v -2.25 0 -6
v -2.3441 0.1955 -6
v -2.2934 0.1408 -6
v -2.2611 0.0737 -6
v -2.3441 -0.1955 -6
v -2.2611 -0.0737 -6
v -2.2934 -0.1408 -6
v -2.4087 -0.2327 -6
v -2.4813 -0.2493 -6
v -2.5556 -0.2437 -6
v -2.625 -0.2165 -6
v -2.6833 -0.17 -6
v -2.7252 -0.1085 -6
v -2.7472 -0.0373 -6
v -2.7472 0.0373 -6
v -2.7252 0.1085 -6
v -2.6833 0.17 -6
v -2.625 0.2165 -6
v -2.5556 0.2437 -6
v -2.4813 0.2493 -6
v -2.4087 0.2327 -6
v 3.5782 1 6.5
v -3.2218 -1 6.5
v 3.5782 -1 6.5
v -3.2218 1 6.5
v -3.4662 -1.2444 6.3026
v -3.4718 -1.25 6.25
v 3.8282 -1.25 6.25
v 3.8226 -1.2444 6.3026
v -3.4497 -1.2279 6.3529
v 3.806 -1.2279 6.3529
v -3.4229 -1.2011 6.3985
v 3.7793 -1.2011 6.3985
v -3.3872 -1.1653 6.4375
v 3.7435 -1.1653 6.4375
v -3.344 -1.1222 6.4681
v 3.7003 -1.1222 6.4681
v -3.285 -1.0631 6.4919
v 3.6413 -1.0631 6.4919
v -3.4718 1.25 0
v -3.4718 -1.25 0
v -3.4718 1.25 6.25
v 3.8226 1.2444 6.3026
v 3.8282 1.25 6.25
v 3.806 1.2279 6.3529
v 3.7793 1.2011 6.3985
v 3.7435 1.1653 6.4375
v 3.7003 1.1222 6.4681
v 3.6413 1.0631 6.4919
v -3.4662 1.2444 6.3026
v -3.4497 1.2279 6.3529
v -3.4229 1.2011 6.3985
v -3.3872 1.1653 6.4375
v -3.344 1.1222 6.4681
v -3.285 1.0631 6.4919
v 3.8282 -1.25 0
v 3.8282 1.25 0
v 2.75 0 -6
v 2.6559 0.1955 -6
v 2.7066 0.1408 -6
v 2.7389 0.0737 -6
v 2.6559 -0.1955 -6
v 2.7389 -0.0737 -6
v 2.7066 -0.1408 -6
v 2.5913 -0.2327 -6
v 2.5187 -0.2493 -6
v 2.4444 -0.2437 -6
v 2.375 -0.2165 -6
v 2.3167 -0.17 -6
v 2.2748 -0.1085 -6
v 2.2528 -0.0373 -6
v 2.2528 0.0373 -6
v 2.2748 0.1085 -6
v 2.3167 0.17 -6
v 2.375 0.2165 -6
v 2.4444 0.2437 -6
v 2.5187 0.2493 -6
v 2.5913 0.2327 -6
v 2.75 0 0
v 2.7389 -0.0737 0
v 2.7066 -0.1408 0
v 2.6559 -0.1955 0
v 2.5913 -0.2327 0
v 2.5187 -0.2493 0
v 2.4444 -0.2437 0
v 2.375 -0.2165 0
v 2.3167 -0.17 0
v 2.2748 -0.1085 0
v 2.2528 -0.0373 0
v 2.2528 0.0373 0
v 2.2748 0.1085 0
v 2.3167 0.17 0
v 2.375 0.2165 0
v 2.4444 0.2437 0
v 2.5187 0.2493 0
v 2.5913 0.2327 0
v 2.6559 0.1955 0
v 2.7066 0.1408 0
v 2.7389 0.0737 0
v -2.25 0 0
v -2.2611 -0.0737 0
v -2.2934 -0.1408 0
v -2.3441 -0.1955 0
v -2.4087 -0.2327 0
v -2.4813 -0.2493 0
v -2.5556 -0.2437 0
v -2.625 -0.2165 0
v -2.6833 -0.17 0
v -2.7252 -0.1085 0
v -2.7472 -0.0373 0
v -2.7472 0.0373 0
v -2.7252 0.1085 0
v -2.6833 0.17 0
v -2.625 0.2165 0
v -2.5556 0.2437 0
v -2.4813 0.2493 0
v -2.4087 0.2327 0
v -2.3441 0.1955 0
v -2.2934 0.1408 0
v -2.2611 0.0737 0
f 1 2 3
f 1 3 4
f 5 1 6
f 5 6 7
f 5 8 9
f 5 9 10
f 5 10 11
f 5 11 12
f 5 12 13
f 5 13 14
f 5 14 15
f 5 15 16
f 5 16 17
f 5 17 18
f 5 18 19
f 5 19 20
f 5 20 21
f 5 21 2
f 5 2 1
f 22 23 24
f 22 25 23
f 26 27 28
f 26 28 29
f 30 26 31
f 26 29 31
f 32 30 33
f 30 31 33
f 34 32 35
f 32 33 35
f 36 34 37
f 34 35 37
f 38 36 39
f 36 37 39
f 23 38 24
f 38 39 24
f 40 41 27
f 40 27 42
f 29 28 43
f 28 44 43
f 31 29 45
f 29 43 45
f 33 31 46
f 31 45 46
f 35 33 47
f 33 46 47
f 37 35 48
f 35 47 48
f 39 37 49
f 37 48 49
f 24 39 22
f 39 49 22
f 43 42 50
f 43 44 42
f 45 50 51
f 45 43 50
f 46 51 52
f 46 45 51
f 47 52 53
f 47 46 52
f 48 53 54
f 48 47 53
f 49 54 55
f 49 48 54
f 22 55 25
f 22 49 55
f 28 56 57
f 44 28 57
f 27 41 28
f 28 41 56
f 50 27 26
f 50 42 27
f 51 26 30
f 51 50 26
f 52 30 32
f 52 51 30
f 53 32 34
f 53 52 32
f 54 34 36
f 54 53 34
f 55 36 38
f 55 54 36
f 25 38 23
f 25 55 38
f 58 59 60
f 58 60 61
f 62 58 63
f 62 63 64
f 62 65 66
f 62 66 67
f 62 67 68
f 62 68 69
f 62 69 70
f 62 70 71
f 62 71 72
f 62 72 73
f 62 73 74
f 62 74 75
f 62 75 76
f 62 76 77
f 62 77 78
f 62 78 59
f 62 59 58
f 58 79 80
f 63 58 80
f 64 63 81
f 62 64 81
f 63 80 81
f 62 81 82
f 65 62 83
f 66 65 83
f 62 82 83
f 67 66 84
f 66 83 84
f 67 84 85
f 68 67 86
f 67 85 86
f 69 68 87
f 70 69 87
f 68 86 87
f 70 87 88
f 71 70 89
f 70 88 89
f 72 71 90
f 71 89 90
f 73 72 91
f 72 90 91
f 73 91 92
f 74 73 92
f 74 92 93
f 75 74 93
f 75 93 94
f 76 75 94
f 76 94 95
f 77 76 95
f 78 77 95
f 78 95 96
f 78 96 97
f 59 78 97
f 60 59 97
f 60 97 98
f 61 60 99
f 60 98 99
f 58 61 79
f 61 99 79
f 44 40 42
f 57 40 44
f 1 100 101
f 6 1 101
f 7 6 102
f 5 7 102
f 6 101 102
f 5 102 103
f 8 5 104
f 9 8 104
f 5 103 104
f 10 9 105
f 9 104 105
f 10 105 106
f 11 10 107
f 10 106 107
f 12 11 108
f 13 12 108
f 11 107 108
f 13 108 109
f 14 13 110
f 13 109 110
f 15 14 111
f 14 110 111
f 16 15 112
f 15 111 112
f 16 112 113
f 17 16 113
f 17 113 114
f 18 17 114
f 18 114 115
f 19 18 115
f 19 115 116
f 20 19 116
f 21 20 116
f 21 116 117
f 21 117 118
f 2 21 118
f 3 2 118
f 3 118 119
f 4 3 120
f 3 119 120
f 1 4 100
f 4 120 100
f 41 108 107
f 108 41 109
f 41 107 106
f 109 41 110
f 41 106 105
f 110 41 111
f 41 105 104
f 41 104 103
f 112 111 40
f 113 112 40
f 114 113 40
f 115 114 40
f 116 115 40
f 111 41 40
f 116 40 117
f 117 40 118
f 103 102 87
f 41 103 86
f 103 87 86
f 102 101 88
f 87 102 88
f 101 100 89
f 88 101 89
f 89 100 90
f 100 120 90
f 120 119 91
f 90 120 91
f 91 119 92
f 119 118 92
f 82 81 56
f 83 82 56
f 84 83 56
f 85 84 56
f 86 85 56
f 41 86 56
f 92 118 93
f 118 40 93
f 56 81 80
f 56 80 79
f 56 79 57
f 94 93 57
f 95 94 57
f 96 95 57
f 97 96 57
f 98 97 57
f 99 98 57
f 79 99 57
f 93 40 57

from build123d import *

# Parameters (mm, degrees)
SKETCH_W     = 7.3
SKETCH_H     = 2.5
PAD_DEPTH    = 6.5
FILLET_R     = 0.25
SKETCH001_R  = 0.25
PAD001_DEPTH = 6


with BuildPart() as part:
    # Sketch → Pad (new body)
    with BuildSketch(Plane.XY):
        with Locations((0.178171, 0)):
            Rectangle(SKETCH_W, SKETCH_H)
    extrude(amount=PAD_DEPTH)

    # Fillet
    fillet_edges = [part.edges().sort_by_distance(p)[0] for p in [
        (0.178171, -1.25, 6.5),
        (0.178171, 1.25, 6.5),
        (3.828171, 0, 6.5),
        (-3.471829, 0, 6.5),
    ]]
    fillet(fillet_edges, radius=FILLET_R)

    # Sketch001 (on Face4 of Fillet) → Pad001 (join)
    with BuildSketch(Plane(origin=(0, 0, 0), x_dir=(1, 0, 0), z_dir=(0, 0, -1))):
        with Locations((2.5, 0)):
            Circle(SKETCH001_R)
        with Locations((-2.5, 0)):
            Circle(SKETCH001_R)
    extrude(amount=PAD001_DEPTH)


solid = part.part
